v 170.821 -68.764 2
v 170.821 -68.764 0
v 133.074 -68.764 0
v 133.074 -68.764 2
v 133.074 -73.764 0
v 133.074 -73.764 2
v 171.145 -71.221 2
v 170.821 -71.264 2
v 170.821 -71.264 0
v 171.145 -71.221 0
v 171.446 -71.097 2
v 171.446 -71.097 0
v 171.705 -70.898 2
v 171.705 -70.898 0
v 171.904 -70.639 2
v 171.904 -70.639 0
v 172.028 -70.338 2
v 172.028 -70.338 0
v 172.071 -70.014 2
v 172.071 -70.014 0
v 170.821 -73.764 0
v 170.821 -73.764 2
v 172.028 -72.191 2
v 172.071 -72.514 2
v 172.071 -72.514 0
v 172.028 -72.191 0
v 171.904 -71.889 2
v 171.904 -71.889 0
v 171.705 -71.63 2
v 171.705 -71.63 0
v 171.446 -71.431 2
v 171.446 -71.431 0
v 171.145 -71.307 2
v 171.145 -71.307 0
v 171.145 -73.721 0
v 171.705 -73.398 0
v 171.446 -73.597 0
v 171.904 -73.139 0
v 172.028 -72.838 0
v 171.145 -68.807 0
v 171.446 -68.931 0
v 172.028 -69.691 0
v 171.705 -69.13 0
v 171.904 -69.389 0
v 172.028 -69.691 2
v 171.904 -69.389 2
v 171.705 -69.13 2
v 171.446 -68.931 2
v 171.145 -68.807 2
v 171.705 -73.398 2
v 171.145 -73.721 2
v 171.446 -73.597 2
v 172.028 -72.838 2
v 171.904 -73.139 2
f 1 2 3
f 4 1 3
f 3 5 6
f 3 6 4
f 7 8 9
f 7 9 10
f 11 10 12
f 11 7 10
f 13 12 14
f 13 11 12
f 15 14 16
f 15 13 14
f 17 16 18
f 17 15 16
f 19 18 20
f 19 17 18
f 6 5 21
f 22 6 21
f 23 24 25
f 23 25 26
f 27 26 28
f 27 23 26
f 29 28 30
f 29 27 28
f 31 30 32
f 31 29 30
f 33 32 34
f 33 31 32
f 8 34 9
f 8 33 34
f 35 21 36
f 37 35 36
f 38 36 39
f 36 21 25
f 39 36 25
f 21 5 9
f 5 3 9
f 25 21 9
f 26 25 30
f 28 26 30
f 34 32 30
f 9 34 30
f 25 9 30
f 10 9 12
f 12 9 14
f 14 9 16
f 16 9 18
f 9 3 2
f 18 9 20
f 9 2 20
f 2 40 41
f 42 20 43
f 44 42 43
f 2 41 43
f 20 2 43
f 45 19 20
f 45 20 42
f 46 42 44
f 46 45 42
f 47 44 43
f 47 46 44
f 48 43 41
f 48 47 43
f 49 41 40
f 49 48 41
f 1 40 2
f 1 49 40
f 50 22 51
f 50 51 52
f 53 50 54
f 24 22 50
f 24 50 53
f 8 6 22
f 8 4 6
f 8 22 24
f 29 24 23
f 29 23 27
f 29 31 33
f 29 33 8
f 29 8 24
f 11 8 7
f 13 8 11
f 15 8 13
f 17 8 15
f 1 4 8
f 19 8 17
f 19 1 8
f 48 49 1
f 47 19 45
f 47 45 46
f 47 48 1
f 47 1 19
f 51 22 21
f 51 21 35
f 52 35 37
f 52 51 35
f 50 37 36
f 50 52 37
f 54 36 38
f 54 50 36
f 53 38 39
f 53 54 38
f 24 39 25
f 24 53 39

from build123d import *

# Parameters (mm, degrees)
SKETCH_1_W      = 10.679510249
SKETCH_1_H      = 5
SKETCH_1_W_2    = 27.06788567
EXTRUDE_1_DEPTH = 2
EXTRUDE_2_DEPTH = 2


with BuildPart() as part:
    # 草图1 → 凸台-拉伸1 (new body)
    with BuildSketch(Plane.XY):
        with Locations((165.481299773, -71.264027464)):
            Rectangle(SKETCH_1_W, SKETCH_1_H)
        with Locations((146.607601814, -71.264027464)):
            Rectangle(SKETCH_1_W_2, SKETCH_1_H)
    extrude(amount=EXTRUDE_1_DEPTH)

    # 草图2 → 凸台-拉伸2 (add)
    with BuildSketch(Plane.XY.offset(2)):
        with BuildLine():
            ThreePointArc((170.821054898, -68.764027464), (169.571054898, -70.014027464), (170.821054898, -71.264027464))
            Line((170.821054898, -71.264027464), (170.821054898, -68.764027464))
        make_face()
        with BuildLine():
            Line((170.821054898, -68.764027464), (170.821054898, -71.264027464))
            ThreePointArc((170.821054898, -71.264027464), (171.704938375, -70.89791094), (172.071054898, -70.014027464))
            ThreePointArc((172.071054898, -70.014027464), (171.704938375, -69.130143987), (170.821054898, -68.764027464))
        make_face()
        with BuildLine():
            ThreePointArc((172.071054898, -72.514027464), (171.704938375, -71.630143987), (170.821054898, -71.264027464))
            Line((170.821054898, -71.264027464), (170.821054898, -73.764027464))
            ThreePointArc((170.821054898, -73.764027464), (171.704938375, -73.39791094), (172.071054898, -72.514027464))
        make_face()
        with BuildLine():
            Line((170.821054898, -73.764027464), (170.821054898, -71.264027464))
            ThreePointArc((170.821054898, -71.264027464), (169.571054898, -72.514027464), (170.821054898, -73.764027464))
        make_face()
    extrude(amount=-EXTRUDE_2_DEPTH)


solid = part.part
